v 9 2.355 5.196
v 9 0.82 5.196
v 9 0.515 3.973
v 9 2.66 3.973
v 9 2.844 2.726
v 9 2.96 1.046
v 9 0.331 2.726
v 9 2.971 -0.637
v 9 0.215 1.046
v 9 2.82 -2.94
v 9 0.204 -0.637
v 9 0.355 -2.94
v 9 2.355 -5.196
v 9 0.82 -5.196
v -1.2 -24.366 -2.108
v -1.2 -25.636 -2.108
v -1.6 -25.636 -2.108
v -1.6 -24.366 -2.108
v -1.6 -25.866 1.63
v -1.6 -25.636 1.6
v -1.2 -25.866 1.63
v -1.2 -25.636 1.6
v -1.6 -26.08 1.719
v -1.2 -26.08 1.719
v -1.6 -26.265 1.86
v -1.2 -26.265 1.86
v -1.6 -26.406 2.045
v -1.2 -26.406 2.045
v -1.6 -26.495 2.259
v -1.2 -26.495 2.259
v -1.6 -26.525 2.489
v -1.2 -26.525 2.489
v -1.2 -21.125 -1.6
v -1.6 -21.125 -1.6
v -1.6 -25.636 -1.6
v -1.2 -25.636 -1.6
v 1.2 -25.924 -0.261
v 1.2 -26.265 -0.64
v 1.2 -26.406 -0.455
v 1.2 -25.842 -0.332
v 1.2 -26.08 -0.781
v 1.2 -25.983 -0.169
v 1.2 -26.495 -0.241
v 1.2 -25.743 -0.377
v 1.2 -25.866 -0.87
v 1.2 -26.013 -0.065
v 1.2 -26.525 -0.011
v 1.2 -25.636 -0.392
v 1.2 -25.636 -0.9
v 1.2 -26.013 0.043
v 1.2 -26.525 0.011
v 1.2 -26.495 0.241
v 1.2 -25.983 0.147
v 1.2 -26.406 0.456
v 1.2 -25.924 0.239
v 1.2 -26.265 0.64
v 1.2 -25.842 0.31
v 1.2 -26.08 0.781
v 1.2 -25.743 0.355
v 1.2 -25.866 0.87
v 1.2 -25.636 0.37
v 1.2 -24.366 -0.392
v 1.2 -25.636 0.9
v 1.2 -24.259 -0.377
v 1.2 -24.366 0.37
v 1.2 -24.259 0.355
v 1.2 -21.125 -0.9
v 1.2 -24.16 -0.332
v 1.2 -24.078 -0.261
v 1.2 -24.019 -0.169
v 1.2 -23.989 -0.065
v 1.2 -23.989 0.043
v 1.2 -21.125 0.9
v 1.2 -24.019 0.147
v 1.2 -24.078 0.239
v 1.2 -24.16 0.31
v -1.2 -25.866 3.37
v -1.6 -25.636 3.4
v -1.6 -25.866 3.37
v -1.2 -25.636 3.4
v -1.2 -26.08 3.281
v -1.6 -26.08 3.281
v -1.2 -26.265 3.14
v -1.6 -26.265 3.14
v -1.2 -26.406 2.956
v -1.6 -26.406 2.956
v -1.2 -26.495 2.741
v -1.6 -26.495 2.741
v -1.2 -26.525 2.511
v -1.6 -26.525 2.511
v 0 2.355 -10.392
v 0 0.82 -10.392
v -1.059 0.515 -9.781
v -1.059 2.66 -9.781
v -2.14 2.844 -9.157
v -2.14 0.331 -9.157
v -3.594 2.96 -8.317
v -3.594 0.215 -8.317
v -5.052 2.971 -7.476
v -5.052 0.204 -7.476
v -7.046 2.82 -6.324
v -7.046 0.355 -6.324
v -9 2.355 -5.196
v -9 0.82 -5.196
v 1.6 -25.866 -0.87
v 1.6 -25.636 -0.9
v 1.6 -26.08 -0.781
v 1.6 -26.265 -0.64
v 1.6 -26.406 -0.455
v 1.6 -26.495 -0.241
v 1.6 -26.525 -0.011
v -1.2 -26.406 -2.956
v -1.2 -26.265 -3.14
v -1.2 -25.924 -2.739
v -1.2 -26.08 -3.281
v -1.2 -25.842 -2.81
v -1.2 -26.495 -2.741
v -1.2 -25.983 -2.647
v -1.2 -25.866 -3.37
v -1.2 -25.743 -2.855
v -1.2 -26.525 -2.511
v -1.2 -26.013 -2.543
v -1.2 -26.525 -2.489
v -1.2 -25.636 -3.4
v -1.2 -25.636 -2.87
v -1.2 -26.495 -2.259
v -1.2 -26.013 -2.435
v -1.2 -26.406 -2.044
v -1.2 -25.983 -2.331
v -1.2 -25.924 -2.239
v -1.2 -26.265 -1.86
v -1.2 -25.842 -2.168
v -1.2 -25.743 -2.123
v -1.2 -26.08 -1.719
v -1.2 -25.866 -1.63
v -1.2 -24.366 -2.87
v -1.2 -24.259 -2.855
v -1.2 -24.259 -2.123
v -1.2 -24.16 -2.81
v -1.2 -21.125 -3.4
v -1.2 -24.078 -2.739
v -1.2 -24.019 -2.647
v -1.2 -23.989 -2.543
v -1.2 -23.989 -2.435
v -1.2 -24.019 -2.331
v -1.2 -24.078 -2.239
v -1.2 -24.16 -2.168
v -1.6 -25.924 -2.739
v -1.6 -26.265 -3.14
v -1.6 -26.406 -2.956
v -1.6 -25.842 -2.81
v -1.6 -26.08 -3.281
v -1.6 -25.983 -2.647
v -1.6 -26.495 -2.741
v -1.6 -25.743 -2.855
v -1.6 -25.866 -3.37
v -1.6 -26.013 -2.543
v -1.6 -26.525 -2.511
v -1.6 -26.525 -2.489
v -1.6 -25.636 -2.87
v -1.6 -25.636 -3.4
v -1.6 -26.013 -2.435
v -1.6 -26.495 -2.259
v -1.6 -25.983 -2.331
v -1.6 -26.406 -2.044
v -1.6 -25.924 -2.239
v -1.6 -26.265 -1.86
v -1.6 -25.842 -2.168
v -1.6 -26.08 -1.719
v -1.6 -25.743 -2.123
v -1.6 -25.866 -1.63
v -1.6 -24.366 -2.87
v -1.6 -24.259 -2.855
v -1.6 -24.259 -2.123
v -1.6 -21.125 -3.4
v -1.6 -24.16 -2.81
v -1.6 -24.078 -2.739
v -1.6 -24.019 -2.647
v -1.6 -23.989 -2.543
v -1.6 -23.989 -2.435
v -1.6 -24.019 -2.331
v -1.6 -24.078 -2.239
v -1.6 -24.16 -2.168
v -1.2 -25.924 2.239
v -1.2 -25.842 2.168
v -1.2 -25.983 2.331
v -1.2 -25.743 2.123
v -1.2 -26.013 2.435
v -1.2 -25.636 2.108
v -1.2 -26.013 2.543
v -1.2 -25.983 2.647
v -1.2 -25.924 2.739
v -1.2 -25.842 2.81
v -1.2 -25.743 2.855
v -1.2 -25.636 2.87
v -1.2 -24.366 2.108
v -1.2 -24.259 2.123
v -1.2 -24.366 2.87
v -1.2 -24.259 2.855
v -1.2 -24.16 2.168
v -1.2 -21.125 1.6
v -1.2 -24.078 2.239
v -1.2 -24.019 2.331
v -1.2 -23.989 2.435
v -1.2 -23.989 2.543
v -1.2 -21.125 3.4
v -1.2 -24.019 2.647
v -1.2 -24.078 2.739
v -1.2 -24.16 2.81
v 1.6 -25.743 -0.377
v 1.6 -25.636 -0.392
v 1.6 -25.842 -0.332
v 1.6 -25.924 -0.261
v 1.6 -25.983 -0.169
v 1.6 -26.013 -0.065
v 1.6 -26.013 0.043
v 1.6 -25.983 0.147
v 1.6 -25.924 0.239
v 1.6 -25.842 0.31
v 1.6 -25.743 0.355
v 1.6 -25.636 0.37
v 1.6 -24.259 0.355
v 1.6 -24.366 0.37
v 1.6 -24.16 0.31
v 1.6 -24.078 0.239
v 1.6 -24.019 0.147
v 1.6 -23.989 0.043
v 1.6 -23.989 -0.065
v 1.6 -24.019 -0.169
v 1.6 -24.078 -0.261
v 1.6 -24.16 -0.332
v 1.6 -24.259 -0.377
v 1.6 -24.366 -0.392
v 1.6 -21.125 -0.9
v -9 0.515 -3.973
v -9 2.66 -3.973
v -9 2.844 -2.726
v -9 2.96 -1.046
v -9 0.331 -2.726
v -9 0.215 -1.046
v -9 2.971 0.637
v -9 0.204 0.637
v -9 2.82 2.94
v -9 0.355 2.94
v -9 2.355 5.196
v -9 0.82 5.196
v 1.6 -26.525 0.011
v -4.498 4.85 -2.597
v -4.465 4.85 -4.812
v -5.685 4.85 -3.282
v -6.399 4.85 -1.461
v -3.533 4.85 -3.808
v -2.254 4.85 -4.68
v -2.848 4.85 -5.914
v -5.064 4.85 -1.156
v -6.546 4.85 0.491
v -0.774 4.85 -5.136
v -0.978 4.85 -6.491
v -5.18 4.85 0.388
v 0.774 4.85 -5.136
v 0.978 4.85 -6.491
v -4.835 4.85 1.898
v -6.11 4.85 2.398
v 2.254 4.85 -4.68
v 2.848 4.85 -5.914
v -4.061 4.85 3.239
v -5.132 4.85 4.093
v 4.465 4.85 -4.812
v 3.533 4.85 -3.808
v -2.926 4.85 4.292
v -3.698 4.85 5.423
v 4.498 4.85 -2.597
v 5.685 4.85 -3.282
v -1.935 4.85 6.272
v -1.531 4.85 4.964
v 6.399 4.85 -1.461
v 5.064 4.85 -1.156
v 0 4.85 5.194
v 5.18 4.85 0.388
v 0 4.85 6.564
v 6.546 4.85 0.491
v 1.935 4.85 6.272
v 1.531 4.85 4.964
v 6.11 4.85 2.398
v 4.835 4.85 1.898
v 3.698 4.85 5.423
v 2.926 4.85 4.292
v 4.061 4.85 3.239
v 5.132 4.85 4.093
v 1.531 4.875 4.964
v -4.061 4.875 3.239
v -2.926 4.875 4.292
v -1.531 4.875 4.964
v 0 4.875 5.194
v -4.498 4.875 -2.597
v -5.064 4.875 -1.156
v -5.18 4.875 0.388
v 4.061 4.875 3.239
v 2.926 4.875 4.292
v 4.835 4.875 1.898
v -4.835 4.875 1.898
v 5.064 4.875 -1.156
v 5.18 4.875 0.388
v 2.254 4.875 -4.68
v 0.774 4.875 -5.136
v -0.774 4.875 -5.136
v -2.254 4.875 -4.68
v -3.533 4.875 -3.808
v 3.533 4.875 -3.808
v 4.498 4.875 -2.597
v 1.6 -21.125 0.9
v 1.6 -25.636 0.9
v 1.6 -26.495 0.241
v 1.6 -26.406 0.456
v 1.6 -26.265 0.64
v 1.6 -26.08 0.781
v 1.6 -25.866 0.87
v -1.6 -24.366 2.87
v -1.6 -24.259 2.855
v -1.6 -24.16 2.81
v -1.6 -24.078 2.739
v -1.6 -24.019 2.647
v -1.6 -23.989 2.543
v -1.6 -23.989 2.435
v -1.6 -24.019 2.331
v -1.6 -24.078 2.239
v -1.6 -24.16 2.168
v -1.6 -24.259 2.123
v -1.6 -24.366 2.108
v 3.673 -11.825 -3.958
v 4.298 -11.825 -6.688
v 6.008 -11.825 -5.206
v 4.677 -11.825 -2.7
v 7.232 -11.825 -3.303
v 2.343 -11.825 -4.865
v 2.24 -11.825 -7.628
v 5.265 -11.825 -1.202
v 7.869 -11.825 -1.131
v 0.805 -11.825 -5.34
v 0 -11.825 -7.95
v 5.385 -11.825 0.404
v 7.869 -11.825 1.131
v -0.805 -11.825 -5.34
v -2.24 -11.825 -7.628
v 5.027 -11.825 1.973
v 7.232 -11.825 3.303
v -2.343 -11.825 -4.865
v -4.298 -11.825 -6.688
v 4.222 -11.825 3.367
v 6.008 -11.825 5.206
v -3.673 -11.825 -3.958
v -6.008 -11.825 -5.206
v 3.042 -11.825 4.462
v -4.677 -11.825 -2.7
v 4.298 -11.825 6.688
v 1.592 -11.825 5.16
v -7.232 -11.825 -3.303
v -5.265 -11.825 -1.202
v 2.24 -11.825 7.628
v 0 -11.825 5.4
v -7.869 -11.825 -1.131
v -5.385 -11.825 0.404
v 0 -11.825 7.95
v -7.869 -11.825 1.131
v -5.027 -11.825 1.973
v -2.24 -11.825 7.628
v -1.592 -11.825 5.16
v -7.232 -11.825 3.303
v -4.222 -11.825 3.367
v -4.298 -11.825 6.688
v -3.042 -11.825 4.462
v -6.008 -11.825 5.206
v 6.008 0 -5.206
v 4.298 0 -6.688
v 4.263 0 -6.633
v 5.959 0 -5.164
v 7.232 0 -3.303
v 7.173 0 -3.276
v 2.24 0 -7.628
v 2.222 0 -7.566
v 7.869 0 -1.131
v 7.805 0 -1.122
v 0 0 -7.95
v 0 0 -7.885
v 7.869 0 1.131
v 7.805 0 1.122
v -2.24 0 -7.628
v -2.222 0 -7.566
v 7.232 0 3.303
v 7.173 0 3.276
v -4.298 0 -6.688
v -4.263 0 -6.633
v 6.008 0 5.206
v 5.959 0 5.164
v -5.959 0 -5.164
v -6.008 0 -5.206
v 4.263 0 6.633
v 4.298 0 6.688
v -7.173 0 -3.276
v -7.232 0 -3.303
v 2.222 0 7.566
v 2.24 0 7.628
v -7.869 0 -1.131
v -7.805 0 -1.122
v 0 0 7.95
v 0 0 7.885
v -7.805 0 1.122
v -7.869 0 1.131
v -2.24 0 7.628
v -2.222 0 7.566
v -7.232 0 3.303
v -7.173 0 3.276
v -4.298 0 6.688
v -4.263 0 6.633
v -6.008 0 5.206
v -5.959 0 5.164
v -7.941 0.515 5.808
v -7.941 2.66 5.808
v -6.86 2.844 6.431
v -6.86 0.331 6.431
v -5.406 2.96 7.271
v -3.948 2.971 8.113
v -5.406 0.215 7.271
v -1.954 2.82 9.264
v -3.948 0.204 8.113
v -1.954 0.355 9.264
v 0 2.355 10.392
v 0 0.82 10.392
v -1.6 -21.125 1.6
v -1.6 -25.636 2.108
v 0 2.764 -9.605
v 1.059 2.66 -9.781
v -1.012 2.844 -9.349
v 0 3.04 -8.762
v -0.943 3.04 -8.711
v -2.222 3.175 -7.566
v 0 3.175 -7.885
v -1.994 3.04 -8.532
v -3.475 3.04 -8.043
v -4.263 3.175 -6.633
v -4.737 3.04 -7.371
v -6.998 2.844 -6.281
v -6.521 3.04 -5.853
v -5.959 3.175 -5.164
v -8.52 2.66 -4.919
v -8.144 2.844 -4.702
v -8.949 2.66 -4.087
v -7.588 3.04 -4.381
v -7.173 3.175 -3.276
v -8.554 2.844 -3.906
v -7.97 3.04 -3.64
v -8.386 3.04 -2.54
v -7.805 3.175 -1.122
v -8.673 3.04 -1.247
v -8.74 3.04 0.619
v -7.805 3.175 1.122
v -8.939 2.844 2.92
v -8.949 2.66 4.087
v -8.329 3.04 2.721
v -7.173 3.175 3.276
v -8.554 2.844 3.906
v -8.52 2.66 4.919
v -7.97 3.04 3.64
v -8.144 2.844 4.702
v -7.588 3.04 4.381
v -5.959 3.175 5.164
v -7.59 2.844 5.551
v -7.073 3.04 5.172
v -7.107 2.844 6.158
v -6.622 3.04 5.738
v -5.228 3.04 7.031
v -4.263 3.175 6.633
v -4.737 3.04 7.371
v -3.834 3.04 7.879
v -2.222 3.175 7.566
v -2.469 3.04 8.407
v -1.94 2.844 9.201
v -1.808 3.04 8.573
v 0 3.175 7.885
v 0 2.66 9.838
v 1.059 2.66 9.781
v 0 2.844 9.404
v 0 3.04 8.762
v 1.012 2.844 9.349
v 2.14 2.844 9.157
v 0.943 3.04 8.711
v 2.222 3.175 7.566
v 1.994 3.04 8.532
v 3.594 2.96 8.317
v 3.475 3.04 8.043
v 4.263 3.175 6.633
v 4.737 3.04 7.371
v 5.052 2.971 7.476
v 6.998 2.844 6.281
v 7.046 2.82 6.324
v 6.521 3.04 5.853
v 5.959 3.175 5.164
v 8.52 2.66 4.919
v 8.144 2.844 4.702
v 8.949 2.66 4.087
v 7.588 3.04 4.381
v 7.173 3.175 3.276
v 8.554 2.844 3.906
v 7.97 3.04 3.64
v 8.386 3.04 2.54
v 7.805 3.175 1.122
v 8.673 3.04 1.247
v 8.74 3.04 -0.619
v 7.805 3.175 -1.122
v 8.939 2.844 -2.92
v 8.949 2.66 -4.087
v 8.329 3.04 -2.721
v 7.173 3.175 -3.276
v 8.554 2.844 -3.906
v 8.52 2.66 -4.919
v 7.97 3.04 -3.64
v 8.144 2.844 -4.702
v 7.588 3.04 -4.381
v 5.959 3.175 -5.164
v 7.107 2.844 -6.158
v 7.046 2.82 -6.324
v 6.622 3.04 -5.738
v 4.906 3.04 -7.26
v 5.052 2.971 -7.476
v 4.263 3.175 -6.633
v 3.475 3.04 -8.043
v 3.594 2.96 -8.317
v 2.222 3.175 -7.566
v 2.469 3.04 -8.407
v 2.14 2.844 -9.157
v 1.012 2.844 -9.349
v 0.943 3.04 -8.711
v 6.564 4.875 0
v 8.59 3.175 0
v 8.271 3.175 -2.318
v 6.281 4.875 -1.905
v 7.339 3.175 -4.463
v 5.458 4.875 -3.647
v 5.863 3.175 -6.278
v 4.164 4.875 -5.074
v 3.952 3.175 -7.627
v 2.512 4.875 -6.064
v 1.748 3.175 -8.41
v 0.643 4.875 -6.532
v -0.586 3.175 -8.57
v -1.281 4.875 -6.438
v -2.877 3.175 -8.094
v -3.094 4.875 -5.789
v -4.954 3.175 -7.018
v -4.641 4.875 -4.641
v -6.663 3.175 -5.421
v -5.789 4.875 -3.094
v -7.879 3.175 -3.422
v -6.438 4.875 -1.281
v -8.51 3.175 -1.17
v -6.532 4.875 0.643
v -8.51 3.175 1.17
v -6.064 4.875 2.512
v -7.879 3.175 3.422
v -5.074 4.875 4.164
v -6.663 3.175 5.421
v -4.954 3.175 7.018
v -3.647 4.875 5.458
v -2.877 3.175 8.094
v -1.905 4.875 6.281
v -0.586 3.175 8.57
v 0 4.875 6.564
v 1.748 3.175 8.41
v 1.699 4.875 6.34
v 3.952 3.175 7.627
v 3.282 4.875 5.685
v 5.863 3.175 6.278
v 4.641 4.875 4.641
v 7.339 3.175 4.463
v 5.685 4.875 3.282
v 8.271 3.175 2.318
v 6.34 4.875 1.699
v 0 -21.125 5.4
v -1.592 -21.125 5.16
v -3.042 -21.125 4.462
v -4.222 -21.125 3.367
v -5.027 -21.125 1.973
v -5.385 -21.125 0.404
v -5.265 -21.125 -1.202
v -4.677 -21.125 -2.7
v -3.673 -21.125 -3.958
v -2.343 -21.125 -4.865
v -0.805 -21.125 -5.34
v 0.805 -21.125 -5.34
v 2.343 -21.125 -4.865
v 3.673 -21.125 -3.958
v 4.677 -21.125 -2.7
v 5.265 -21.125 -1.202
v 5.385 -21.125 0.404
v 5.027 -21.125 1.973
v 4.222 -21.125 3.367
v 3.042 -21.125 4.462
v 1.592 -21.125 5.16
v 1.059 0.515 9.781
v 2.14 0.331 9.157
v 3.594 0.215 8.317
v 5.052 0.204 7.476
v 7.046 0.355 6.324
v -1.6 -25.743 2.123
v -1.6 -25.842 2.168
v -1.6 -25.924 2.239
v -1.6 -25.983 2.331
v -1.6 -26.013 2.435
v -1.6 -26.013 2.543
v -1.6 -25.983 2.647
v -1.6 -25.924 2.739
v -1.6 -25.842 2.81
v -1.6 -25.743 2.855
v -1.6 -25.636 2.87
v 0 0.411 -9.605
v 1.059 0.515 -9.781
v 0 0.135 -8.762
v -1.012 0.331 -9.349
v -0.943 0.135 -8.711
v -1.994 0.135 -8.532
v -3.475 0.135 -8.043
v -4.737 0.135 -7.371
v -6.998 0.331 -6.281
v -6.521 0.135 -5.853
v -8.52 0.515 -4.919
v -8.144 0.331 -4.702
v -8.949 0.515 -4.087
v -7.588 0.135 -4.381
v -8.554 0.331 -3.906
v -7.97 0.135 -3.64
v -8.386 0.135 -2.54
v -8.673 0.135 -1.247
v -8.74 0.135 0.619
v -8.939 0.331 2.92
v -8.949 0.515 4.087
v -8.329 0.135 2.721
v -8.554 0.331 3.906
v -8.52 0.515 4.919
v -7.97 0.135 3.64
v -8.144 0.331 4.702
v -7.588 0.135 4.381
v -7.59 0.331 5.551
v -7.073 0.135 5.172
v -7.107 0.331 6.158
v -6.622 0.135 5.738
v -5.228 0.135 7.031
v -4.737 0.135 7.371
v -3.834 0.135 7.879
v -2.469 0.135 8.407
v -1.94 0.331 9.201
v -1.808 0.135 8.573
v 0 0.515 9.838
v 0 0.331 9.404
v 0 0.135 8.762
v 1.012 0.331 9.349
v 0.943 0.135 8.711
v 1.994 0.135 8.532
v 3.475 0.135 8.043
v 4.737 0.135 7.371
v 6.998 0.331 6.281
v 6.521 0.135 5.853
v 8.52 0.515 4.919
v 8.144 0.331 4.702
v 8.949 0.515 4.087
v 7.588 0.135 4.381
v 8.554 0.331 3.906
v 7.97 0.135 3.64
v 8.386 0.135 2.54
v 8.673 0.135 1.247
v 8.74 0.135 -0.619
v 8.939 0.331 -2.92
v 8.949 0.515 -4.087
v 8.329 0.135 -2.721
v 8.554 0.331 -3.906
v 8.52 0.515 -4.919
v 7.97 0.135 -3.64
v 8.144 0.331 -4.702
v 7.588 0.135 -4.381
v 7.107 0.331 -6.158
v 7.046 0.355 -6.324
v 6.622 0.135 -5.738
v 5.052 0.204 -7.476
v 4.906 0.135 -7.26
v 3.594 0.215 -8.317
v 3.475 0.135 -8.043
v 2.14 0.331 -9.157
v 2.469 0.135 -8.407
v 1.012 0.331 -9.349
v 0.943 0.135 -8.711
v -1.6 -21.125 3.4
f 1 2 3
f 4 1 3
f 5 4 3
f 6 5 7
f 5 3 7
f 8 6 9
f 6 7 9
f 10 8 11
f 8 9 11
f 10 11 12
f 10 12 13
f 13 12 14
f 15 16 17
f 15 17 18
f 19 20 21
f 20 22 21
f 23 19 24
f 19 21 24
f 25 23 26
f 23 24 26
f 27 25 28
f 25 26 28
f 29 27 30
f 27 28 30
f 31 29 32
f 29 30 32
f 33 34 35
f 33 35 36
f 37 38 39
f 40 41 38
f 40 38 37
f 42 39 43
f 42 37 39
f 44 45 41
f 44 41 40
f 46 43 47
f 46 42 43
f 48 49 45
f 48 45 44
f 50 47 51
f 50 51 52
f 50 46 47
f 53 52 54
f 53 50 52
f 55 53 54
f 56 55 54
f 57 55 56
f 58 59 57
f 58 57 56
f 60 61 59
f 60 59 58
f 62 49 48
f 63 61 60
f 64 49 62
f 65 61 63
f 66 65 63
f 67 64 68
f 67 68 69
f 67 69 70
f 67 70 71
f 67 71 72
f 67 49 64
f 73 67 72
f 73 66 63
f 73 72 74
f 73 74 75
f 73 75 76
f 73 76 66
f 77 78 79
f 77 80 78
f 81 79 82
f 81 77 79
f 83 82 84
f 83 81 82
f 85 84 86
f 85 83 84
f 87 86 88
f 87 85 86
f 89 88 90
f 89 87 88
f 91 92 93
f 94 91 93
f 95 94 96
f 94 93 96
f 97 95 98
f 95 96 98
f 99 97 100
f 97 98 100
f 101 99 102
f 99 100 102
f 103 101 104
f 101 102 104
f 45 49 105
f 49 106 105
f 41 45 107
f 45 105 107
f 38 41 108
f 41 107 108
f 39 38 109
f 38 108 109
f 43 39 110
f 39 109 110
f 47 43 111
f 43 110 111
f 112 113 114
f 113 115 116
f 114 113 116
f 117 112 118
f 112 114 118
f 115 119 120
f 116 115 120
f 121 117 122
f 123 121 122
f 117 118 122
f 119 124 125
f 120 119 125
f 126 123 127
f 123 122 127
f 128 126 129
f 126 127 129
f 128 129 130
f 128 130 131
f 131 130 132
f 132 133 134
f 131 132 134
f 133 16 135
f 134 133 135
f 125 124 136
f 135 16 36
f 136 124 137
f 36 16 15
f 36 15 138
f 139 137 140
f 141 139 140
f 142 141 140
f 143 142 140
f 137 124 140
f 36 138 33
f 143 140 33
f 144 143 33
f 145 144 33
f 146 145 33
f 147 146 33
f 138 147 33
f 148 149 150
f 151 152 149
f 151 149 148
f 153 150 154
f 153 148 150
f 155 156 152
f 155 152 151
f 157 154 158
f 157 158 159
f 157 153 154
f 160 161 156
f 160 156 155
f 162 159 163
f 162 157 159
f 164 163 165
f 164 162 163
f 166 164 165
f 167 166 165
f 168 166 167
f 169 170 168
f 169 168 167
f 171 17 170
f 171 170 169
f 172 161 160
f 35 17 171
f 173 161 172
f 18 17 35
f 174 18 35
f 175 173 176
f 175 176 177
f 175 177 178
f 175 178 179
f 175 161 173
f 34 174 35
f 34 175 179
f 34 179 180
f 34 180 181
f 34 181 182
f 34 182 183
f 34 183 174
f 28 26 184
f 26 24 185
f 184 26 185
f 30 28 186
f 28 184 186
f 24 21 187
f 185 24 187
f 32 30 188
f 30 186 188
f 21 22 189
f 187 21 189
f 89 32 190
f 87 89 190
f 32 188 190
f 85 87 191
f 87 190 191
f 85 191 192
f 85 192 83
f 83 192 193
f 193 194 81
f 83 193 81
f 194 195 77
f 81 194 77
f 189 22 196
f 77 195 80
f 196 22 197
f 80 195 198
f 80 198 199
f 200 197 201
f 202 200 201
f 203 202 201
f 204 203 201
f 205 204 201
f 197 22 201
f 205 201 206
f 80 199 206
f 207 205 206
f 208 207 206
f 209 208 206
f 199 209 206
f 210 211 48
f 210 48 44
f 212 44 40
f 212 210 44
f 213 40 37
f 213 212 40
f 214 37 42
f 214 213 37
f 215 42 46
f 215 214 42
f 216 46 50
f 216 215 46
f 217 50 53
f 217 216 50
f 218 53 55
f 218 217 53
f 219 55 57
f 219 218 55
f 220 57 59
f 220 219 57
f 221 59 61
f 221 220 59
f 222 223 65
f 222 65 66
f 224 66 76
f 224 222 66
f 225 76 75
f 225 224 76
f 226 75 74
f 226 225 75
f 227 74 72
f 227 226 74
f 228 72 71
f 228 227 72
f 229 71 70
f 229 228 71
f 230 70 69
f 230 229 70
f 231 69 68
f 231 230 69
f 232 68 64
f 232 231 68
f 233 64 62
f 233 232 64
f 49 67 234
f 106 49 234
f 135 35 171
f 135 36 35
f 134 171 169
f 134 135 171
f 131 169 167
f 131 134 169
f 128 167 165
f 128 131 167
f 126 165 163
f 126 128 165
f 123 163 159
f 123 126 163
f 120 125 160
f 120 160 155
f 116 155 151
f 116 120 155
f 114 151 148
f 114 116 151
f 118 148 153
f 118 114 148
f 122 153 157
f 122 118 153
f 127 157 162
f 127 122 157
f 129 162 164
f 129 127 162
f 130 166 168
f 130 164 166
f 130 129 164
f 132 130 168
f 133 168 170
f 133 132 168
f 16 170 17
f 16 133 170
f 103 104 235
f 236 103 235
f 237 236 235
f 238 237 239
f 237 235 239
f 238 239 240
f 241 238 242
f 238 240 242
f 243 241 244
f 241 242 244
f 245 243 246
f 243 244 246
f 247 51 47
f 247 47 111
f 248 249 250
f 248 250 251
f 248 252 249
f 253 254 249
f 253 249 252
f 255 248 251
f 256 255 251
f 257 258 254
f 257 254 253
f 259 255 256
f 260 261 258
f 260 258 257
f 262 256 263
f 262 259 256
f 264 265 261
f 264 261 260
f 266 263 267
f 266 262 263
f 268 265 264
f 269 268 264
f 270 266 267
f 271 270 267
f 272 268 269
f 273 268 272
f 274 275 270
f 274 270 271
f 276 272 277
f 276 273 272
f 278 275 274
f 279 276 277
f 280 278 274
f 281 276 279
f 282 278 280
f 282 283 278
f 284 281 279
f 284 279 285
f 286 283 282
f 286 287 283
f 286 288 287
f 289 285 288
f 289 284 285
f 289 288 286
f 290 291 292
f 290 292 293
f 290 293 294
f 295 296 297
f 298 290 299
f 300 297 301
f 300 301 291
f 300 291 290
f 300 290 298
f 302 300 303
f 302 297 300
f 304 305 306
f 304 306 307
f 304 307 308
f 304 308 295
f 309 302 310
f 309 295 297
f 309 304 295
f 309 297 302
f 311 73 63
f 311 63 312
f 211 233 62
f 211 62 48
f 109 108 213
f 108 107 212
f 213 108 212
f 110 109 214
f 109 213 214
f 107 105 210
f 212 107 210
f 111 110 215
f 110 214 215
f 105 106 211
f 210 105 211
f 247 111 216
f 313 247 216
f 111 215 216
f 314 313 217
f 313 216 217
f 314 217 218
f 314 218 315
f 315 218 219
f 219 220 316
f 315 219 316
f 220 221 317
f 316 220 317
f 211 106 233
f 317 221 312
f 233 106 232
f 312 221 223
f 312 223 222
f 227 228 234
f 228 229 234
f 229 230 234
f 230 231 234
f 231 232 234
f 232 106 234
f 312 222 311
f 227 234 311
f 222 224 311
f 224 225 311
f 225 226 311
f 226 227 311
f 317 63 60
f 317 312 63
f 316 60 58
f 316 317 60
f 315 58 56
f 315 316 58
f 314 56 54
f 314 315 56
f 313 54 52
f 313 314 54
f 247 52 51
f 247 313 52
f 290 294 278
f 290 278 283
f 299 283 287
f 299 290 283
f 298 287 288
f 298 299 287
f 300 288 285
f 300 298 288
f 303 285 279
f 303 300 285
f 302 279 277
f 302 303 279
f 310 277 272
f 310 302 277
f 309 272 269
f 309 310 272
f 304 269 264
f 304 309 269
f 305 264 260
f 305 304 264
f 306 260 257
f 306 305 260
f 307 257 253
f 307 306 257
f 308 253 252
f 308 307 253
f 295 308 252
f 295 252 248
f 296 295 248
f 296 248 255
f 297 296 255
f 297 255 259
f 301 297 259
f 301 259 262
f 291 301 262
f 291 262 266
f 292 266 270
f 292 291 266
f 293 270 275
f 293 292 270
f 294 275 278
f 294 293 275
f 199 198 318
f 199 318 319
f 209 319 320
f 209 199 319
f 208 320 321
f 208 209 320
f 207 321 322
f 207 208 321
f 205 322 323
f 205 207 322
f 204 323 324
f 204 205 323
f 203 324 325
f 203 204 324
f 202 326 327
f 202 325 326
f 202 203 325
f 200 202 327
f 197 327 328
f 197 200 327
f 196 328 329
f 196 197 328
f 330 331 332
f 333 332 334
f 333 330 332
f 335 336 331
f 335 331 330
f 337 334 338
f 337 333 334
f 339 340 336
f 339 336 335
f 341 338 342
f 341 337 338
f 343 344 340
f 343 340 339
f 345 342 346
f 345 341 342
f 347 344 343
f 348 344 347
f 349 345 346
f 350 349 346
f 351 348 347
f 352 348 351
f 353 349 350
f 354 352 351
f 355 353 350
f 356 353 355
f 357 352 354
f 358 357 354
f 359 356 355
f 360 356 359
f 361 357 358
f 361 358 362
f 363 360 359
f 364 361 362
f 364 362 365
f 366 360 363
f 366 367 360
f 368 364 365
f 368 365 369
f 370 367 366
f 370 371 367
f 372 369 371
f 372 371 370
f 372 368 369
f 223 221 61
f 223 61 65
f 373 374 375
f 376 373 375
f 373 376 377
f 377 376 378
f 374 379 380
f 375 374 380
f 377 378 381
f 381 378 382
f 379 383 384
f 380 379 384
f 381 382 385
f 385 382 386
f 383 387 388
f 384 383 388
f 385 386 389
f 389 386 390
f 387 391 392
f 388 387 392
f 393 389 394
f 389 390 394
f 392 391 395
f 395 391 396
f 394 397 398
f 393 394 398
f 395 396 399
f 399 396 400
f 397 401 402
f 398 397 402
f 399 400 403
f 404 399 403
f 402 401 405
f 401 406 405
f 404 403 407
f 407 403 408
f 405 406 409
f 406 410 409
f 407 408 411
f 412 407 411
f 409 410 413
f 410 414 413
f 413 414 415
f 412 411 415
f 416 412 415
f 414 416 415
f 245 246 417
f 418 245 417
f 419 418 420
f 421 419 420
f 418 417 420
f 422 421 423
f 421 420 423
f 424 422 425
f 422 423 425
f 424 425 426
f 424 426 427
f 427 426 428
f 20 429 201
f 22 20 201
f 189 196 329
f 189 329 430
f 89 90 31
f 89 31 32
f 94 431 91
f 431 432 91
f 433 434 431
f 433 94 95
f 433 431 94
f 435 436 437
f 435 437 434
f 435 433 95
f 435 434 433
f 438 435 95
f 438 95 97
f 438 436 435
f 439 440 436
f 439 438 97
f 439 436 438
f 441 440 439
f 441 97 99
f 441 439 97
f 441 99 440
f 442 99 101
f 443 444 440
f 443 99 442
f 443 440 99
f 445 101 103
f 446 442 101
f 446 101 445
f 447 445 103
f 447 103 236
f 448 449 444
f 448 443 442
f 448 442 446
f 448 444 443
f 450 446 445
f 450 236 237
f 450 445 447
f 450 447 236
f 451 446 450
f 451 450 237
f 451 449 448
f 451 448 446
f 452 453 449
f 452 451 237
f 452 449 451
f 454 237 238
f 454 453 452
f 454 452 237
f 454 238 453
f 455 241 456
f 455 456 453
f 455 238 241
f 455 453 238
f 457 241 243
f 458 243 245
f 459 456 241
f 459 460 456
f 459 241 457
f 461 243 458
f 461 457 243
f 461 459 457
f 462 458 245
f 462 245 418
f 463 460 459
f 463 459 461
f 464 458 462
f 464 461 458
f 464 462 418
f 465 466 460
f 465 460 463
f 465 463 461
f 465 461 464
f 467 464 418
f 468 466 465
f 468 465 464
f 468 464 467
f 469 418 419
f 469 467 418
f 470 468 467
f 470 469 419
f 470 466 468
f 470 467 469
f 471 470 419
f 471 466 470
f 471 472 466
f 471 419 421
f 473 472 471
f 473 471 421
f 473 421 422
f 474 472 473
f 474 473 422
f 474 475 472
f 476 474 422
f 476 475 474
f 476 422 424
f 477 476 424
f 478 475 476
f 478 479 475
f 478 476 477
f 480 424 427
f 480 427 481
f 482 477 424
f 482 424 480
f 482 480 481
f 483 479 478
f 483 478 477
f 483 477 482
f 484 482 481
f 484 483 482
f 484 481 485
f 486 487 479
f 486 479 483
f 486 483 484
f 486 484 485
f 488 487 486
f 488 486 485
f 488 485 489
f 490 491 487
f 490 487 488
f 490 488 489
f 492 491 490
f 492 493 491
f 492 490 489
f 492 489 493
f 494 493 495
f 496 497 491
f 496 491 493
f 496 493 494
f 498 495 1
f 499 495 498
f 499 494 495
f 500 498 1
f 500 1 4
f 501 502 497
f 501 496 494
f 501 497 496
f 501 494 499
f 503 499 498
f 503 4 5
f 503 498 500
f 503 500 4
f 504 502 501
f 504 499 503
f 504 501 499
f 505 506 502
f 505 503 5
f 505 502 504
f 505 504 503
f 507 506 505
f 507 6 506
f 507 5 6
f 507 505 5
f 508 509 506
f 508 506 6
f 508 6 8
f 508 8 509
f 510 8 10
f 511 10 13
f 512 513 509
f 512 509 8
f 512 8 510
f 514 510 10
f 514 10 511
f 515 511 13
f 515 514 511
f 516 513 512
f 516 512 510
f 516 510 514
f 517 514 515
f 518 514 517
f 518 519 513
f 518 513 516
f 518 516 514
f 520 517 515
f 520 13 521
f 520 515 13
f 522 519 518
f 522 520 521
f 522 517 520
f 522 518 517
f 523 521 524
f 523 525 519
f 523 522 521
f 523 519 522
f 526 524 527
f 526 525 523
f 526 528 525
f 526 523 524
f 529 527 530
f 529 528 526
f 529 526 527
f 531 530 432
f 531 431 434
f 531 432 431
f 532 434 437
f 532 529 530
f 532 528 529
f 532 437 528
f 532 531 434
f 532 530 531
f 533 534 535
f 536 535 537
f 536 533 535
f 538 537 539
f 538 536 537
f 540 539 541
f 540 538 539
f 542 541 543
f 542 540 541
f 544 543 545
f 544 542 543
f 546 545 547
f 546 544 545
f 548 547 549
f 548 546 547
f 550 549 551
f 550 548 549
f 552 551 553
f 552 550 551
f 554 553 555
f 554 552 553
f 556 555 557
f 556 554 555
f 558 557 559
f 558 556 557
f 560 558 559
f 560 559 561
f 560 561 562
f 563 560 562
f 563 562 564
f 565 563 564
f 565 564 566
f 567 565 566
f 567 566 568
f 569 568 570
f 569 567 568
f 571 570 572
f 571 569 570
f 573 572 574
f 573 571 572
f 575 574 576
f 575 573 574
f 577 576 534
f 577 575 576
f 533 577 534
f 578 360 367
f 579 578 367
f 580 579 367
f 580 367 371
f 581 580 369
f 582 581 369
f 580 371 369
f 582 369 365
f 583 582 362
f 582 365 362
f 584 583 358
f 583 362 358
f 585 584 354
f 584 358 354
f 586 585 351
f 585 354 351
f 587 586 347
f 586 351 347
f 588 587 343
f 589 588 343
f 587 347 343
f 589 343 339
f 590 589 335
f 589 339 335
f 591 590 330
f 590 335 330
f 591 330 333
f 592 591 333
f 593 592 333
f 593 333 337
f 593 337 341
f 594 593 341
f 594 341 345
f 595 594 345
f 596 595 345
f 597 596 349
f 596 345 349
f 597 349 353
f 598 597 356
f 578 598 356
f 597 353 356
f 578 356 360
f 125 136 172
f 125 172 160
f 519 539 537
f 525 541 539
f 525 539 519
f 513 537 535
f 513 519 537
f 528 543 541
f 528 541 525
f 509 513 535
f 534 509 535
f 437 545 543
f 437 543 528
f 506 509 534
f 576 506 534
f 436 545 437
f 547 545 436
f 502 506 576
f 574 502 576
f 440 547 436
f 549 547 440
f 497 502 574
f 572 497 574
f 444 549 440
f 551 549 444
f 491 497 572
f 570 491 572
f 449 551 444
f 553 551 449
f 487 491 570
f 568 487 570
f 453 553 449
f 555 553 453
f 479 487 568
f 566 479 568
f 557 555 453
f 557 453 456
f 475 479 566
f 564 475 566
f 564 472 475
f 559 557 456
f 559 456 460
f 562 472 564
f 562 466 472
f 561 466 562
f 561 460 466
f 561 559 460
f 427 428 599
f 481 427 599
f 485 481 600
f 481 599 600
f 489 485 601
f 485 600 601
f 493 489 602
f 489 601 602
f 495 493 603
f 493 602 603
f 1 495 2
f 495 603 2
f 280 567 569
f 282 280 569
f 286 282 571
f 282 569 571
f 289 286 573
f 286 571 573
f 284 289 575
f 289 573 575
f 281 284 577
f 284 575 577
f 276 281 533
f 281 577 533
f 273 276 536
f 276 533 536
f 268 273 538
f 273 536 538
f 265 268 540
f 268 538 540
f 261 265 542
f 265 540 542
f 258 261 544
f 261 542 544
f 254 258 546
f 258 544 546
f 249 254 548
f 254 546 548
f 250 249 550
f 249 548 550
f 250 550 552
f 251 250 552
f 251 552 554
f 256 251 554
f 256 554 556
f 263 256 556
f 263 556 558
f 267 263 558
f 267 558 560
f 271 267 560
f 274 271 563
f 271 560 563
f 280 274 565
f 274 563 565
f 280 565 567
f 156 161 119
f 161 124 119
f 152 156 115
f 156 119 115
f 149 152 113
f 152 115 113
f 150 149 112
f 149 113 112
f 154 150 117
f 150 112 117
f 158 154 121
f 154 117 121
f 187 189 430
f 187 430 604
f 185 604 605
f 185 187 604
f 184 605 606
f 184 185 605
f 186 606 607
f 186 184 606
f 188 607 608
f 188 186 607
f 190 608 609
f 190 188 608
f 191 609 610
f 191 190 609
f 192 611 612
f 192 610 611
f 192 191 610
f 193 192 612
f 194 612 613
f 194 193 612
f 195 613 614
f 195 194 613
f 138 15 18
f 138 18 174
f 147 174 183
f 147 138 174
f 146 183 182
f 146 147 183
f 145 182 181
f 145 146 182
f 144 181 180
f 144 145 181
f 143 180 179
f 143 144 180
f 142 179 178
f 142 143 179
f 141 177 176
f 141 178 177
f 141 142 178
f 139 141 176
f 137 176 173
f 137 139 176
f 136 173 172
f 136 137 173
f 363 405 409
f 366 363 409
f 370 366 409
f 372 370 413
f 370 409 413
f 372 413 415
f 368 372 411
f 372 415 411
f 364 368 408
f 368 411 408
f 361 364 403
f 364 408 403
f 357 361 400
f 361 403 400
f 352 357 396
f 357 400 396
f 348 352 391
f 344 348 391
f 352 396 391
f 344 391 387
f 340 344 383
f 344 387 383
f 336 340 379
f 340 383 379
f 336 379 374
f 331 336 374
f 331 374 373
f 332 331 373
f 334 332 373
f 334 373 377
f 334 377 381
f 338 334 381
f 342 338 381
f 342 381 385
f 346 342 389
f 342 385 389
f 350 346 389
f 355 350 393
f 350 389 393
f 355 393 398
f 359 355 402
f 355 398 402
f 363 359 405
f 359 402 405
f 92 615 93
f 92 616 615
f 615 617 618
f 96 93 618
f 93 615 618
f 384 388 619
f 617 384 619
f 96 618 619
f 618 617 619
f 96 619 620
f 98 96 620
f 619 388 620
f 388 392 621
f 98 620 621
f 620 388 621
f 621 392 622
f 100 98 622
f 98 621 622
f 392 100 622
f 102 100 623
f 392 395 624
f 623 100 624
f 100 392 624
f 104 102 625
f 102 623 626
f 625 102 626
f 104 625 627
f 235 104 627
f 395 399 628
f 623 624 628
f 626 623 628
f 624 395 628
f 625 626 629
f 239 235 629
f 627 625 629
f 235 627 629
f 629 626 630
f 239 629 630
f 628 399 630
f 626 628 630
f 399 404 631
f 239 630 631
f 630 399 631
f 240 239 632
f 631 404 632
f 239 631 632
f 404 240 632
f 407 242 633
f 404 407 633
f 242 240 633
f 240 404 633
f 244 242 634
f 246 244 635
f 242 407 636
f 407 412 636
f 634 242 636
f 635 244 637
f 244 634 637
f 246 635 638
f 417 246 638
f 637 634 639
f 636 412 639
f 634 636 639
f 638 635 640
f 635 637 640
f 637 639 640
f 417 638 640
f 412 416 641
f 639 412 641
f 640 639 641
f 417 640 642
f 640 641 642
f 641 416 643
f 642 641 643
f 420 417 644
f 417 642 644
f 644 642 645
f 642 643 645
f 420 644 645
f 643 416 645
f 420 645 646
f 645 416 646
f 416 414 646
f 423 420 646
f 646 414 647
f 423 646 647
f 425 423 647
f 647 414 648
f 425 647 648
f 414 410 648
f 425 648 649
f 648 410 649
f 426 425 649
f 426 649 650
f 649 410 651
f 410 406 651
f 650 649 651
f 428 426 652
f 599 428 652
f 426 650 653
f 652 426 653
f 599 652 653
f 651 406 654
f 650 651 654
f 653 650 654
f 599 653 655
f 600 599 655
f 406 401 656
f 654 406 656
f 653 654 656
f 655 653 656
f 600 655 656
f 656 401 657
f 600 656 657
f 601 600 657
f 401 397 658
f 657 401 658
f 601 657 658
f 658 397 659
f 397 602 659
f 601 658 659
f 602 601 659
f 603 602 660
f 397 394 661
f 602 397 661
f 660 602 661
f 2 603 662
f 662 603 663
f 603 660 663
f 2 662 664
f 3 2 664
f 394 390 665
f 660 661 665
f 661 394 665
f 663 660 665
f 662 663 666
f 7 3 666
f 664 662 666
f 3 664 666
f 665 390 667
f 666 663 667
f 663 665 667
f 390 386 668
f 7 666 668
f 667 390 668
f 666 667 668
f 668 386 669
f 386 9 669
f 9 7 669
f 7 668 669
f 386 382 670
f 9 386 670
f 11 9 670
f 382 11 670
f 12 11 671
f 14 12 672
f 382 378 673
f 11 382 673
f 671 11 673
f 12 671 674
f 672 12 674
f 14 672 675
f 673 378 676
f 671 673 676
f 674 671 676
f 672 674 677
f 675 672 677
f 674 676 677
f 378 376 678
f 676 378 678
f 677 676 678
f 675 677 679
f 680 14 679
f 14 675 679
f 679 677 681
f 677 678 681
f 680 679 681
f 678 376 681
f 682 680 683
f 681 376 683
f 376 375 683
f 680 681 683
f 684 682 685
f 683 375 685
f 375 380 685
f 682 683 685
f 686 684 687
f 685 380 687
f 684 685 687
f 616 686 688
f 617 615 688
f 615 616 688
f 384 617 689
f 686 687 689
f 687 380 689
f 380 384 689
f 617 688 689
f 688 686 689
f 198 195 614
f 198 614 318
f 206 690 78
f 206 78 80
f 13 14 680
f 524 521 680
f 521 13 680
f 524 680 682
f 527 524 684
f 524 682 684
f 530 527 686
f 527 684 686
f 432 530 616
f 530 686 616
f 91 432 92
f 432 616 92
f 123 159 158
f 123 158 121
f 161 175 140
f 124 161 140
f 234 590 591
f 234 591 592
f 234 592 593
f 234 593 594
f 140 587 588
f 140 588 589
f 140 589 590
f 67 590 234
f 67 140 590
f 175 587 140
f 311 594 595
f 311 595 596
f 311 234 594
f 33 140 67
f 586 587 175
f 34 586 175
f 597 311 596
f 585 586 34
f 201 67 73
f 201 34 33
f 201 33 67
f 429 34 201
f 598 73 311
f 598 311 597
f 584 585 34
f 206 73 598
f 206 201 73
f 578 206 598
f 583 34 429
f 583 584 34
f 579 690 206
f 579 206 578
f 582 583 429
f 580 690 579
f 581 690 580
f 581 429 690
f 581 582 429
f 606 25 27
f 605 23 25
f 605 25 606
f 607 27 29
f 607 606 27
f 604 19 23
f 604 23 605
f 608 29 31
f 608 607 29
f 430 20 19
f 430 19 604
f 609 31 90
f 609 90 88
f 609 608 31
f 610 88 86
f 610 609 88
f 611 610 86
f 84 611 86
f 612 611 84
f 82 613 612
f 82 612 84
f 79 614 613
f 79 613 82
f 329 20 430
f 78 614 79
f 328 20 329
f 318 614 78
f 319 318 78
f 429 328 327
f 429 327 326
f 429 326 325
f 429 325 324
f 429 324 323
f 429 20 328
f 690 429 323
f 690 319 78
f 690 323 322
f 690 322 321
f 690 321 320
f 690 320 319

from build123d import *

# Parameters (mm, degrees)
BOSS_EXTRUDE1_DEPTH = 3.175
SKETCH2_R           = 7.95
BOSS_EXTRUDE2_DEPTH = 11.825
SKETCH3_R           = 5.4
BOSS_EXTRUDE3_DEPTH = 9.3
SKETCH4_W           = 0.4
SKETCH4_H           = 1.8
BOSS_EXTRUDE4_DEPTH = 5.4
FILLET1_R           = 0.889
CUT_EXTRUDE1_DEPTH  = 31.396309398
SKETCH6_R           = 8.589918765
BOSS_EXTRUDE5_DEPTH = 1.7
BOSS_EXTRUDE5_TAPER = 50
SKETCH8_R           = 6.563937658
SKETCH8_R_2         = 5.1943
CUT_EXTRUDE2_DEPTH  = 0.0254


with BuildPart() as part:
    # Sketch1 → Boss-Extrude1 (new body)
    with BuildSketch(Plane(origin=(0, 0, 0), x_dir=(1, 0, 0), z_dir=(0, 1, 0))):
        Polygon((9, 5.196152423), (0, 10.392304845), (-9, 5.196152423), (-9, -5.196152423), (0, -10.392304845), (9, -5.196152423), align=None)
    extrude(amount=BOSS_EXTRUDE1_DEPTH)

    # Sketch2 → Boss-Extrude2 (add)
    with BuildSketch(Plane.XZ):
        with Locations(Location((0, 0, 0), (0, 0, 90))):
            Circle(SKETCH2_R)
    extrude(amount=BOSS_EXTRUDE2_DEPTH)

    # Sketch3 → Boss-Extrude3 (add)
    with BuildSketch(Plane.XZ.offset(11.825)):
        with Locations(Location((0, 0, 0), (0, 0, 90))):
            Circle(SKETCH3_R)
    extrude(amount=BOSS_EXTRUDE3_DEPTH)

    # Sketch4 → Boss-Extrude4 (add)
    with BuildSketch(Plane.XZ.offset(21.125)):
        with Locations((-1.4, 2.5)):
            Rectangle(SKETCH4_W, SKETCH4_H)
        with Locations((-1.4, -2.5)):
            Rectangle(SKETCH4_W, SKETCH4_H)
        with Locations((1.4, 0)):
            Rectangle(SKETCH4_W, SKETCH4_H)
    extrude(amount=BOSS_EXTRUDE4_DEPTH)

    # Fillet1
    fillet1_edges = [part.edges().sort_by_distance(p)[0] for p in [
        (-1.4, -26.525, 1.6),
        (-1.4, -26.525, 3.4),
        (-1.4, -26.525, -3.4),
        (-1.4, -26.525, -1.6),
        (1.4, -26.525, -0.9),
        (1.4, -26.525, 0.9),
    ]]
    fillet(fillet1_edges, radius=FILLET1_R)

    # Sketch5 → Cut-Extrude1 (cut, through all)
    with BuildSketch(Plane(origin=(1.6, 0, 0), x_dir=(0, 0, -1), z_dir=(1, 0, 0))):
        with BuildLine():
            Line((-0.37, -25.636), (-0.37, -24.366))
            ThreePointArc((-0.37, -24.366), (0.011, -23.985), (0.392, -24.366))
            Line((0.392, -24.366), (0.392, -25.636))
            ThreePointArc((0.392, -25.636), (0.011, -26.017), (-0.37, -25.636))
        make_face()
        with BuildLine():
            Line((-2.87, -25.636), (-2.87, -24.366))
            ThreePointArc((-2.87, -24.366), (-2.489, -23.985), (-2.108, -24.366))
            Line((-2.108, -24.366), (-2.108, -25.636))
            ThreePointArc((-2.108, -25.636), (-2.489, -26.017), (-2.87, -25.636))
        make_face()
        with BuildLine():
            Line((2.108, -25.636), (2.108, -24.366))
            ThreePointArc((2.108, -24.366), (2.489, -23.985), (2.87, -24.366))
            Line((2.87, -24.366), (2.87, -25.636))
            ThreePointArc((2.87, -25.636), (2.489, -26.017), (2.108, -25.636))
        make_face()
    extrude(amount=-CUT_EXTRUDE1_DEPTH, mode=Mode.SUBTRACT)

    # Sketch6 → Boss-Extrude5 (add)
    with BuildSketch(Plane(origin=(0, 3.175, 0), x_dir=(1, 0, 0), z_dir=(0, 1, 0))):
        Circle(SKETCH6_R)
    extrude(amount=BOSS_EXTRUDE5_DEPTH, taper=BOSS_EXTRUDE5_TAPER)

    # Sketch7 → Cut-Revolve1 (revolve, cut)
    with BuildSketch(Plane(origin=(0, 0, 0), x_dir=(0, 0, -1), z_dir=(1, 0, 0))):
        with BuildLine():
            Line((7.885247447, 3.175), (10.392304845, 3.175))
            Line((10.392304845, 3.175), (10.392304845, 2.354871392))
            ThreePointArc((10.392304845, 2.354871392), (9.18924806, 2.919223674), (7.885247447, 3.175))
        make_face()
    cut_revolve1 = revolve(axis=Axis((0, 0, 0), (0, 1, 0)), mode=Mode.SUBTRACT)

    # Mirror1: Cut-Revolve1 across plane
    add(cut_revolve1.mirror(Plane(origin=(0, 1.5875, 0), x_dir=(0, 0, 1), z_dir=(0, -1, 0))), mode=Mode.SUBTRACT)

    # Sketch8 → Cut-Extrude2 (cut)
    with BuildSketch(Plane(origin=(0, 4.875, 0), x_dir=(1, 0, 0), z_dir=(0, 1, 0))):
        with Locations(Location((0, 0, 0), (0, 0, 270))):
            Circle(SKETCH8_R)
        with Locations(Location((0, 0, 0), (0, 0, 270))):
            Circle(SKETCH8_R_2, mode=Mode.SUBTRACT)
    extrude(amount=-CUT_EXTRUDE2_DEPTH, mode=Mode.SUBTRACT)


solid = part.part
